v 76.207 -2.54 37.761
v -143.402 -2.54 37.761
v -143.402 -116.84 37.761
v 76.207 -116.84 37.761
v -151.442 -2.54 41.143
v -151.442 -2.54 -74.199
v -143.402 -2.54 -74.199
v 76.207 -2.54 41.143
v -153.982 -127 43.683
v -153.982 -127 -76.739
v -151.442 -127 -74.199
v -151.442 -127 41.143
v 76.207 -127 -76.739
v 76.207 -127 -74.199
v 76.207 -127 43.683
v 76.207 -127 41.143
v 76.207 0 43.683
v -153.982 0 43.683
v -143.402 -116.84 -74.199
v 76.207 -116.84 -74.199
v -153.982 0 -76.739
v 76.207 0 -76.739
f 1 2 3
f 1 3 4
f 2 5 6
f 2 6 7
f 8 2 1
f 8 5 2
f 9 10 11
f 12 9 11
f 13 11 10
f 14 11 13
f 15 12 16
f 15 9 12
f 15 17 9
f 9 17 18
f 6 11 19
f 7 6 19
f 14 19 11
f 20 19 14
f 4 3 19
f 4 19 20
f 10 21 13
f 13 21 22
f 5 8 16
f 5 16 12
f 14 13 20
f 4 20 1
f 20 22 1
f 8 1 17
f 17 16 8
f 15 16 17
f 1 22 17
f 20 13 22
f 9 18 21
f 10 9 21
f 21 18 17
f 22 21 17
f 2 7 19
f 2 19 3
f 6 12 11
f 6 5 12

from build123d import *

# Parameters (mm, degrees)
F1_DEPTH = 127
F2_T     = -2.54
F3_W     = 219.6087762713
F3_H     = 111.9595093346
F4_DEPTH = 114.3


with BuildPart() as f1:
    # F0 (on Front) → F1 (new body)
    with BuildSketch(Plane.XZ):
        Polygon((-9.013194183, 43.6832010746), (-153.9823263884, 43.6832010746), (-153.9823263884, -76.7388492823), (76.2072727084, -76.7388492823), (76.2072727084, -73.0584636331), (-135.6322020292, -73.0584636331), (-38.0154103041, 16.9434007257), align=None)
        Polygon((76.2072727084, 43.6832010746), (-9.013194183, 43.6832010746), (-38.0154103041, 16.9434007257), (76.2072727084, 16.9434007257), align=None)
        Polygon((76.2072727084, 16.9434007257), (-38.0154103041, 16.9434007257), (-135.6322020292, -73.0584636331), (76.2072727084, -73.0584636331), align=None)
    extrude(amount=F1_DEPTH)

    # F2
    f2_openings = [f1.faces().sort_by_distance(p)[0] for p in [
        (-38.887527, -127, -16.527824),
        (76.207273, -63.5, -16.527824),
    ]]
    offset(amount=F2_T, openings=f2_openings)

    # F3 (on face) → F4 (join)
    with BuildSketch(Plane.XZ.offset(2.54)):
        with Locations((-33.5971154273, -18.219094615)):
            Rectangle(F3_W, F3_H)
    extrude(amount=F4_DEPTH)


solid = f1.part
